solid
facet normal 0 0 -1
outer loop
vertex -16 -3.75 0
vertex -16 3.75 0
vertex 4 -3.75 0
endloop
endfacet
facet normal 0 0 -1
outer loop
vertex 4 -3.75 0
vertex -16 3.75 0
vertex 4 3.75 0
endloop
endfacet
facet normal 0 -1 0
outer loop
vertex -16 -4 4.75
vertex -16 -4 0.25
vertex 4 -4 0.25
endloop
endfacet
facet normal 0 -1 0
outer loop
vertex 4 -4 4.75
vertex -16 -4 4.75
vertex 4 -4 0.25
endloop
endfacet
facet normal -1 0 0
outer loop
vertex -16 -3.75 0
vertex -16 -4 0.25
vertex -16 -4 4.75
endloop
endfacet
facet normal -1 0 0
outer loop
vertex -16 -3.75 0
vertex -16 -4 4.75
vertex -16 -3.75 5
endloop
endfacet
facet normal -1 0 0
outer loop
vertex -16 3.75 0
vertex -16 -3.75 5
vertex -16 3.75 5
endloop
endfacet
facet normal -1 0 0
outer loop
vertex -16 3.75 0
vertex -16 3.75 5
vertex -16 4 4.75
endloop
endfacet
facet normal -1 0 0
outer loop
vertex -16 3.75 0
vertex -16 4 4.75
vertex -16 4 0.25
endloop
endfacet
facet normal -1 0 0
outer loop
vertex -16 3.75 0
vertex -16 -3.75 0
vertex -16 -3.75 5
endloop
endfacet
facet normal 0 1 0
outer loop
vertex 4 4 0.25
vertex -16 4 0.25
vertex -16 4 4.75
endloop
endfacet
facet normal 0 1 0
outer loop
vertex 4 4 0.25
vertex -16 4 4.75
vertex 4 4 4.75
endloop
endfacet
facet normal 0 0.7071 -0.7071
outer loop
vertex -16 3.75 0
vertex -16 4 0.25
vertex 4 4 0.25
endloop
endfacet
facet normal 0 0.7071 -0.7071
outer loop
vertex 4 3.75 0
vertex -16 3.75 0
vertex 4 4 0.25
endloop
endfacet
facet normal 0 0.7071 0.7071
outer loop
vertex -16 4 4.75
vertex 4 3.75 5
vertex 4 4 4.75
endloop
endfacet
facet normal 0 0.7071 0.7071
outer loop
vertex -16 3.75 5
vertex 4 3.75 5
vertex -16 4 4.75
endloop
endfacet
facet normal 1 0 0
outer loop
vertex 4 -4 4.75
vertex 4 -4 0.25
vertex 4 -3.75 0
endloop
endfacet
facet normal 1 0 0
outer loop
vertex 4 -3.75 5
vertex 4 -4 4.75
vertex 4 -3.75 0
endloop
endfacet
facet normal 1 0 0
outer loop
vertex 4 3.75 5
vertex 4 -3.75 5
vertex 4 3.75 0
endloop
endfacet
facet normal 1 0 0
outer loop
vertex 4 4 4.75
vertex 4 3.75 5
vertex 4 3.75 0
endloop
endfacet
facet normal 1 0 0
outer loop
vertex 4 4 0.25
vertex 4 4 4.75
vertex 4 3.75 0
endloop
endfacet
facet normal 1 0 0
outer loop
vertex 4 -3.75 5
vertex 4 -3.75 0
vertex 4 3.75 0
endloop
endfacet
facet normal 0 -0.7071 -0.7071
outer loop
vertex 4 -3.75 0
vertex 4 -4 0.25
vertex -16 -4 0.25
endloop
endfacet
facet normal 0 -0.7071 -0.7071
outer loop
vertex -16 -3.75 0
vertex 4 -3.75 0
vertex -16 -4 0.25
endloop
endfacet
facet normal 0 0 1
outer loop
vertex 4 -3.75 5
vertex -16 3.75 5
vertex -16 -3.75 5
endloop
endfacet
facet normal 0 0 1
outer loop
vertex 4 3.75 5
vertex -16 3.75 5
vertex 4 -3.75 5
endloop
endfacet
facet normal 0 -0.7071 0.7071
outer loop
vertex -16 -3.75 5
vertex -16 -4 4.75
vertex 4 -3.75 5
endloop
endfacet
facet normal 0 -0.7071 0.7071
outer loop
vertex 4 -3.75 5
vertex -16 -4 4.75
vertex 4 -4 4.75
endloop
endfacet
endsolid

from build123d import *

# Parameters (mm, degrees)
EXTRUDE1_DEPTH = 5
SKETCH2_W      = 20
SKETCH2_H      = 8
EXTRUDE2_DEPTH = 5
CHAMFER1_SIZE  = 0.25


with BuildPart() as part:
    # Sketch1 → Extrude1 (new body)
    with BuildSketch(Plane.XY):
        with BuildLine():
            Line((0, 4), (-12, 4))
            ThreePointArc((-12, 4), (-16, 0), (-12, -4))
            Line((-12, -4), (0, -4))
            ThreePointArc((0, -4), (4, 0), (0, 4))
        make_face()
    extrude(amount=EXTRUDE1_DEPTH)

    # Sketch2 → Extrude2 (add)
    with BuildSketch(Plane.XY):
        with Locations((-6, 0)):
            Rectangle(SKETCH2_W, SKETCH2_H)
    extrude(amount=EXTRUDE2_DEPTH)

    # Chamfer1
    chamfer1_edges = [part.edges().sort_by_distance(p)[0] for p in [
        (-6, -4, 5),
        (-6, -4, 0),
        (-6, 4, 0),
        (-6, 4, 5),
    ]]
    chamfer(chamfer1_edges, length=CHAMFER1_SIZE)


solid = part.part
